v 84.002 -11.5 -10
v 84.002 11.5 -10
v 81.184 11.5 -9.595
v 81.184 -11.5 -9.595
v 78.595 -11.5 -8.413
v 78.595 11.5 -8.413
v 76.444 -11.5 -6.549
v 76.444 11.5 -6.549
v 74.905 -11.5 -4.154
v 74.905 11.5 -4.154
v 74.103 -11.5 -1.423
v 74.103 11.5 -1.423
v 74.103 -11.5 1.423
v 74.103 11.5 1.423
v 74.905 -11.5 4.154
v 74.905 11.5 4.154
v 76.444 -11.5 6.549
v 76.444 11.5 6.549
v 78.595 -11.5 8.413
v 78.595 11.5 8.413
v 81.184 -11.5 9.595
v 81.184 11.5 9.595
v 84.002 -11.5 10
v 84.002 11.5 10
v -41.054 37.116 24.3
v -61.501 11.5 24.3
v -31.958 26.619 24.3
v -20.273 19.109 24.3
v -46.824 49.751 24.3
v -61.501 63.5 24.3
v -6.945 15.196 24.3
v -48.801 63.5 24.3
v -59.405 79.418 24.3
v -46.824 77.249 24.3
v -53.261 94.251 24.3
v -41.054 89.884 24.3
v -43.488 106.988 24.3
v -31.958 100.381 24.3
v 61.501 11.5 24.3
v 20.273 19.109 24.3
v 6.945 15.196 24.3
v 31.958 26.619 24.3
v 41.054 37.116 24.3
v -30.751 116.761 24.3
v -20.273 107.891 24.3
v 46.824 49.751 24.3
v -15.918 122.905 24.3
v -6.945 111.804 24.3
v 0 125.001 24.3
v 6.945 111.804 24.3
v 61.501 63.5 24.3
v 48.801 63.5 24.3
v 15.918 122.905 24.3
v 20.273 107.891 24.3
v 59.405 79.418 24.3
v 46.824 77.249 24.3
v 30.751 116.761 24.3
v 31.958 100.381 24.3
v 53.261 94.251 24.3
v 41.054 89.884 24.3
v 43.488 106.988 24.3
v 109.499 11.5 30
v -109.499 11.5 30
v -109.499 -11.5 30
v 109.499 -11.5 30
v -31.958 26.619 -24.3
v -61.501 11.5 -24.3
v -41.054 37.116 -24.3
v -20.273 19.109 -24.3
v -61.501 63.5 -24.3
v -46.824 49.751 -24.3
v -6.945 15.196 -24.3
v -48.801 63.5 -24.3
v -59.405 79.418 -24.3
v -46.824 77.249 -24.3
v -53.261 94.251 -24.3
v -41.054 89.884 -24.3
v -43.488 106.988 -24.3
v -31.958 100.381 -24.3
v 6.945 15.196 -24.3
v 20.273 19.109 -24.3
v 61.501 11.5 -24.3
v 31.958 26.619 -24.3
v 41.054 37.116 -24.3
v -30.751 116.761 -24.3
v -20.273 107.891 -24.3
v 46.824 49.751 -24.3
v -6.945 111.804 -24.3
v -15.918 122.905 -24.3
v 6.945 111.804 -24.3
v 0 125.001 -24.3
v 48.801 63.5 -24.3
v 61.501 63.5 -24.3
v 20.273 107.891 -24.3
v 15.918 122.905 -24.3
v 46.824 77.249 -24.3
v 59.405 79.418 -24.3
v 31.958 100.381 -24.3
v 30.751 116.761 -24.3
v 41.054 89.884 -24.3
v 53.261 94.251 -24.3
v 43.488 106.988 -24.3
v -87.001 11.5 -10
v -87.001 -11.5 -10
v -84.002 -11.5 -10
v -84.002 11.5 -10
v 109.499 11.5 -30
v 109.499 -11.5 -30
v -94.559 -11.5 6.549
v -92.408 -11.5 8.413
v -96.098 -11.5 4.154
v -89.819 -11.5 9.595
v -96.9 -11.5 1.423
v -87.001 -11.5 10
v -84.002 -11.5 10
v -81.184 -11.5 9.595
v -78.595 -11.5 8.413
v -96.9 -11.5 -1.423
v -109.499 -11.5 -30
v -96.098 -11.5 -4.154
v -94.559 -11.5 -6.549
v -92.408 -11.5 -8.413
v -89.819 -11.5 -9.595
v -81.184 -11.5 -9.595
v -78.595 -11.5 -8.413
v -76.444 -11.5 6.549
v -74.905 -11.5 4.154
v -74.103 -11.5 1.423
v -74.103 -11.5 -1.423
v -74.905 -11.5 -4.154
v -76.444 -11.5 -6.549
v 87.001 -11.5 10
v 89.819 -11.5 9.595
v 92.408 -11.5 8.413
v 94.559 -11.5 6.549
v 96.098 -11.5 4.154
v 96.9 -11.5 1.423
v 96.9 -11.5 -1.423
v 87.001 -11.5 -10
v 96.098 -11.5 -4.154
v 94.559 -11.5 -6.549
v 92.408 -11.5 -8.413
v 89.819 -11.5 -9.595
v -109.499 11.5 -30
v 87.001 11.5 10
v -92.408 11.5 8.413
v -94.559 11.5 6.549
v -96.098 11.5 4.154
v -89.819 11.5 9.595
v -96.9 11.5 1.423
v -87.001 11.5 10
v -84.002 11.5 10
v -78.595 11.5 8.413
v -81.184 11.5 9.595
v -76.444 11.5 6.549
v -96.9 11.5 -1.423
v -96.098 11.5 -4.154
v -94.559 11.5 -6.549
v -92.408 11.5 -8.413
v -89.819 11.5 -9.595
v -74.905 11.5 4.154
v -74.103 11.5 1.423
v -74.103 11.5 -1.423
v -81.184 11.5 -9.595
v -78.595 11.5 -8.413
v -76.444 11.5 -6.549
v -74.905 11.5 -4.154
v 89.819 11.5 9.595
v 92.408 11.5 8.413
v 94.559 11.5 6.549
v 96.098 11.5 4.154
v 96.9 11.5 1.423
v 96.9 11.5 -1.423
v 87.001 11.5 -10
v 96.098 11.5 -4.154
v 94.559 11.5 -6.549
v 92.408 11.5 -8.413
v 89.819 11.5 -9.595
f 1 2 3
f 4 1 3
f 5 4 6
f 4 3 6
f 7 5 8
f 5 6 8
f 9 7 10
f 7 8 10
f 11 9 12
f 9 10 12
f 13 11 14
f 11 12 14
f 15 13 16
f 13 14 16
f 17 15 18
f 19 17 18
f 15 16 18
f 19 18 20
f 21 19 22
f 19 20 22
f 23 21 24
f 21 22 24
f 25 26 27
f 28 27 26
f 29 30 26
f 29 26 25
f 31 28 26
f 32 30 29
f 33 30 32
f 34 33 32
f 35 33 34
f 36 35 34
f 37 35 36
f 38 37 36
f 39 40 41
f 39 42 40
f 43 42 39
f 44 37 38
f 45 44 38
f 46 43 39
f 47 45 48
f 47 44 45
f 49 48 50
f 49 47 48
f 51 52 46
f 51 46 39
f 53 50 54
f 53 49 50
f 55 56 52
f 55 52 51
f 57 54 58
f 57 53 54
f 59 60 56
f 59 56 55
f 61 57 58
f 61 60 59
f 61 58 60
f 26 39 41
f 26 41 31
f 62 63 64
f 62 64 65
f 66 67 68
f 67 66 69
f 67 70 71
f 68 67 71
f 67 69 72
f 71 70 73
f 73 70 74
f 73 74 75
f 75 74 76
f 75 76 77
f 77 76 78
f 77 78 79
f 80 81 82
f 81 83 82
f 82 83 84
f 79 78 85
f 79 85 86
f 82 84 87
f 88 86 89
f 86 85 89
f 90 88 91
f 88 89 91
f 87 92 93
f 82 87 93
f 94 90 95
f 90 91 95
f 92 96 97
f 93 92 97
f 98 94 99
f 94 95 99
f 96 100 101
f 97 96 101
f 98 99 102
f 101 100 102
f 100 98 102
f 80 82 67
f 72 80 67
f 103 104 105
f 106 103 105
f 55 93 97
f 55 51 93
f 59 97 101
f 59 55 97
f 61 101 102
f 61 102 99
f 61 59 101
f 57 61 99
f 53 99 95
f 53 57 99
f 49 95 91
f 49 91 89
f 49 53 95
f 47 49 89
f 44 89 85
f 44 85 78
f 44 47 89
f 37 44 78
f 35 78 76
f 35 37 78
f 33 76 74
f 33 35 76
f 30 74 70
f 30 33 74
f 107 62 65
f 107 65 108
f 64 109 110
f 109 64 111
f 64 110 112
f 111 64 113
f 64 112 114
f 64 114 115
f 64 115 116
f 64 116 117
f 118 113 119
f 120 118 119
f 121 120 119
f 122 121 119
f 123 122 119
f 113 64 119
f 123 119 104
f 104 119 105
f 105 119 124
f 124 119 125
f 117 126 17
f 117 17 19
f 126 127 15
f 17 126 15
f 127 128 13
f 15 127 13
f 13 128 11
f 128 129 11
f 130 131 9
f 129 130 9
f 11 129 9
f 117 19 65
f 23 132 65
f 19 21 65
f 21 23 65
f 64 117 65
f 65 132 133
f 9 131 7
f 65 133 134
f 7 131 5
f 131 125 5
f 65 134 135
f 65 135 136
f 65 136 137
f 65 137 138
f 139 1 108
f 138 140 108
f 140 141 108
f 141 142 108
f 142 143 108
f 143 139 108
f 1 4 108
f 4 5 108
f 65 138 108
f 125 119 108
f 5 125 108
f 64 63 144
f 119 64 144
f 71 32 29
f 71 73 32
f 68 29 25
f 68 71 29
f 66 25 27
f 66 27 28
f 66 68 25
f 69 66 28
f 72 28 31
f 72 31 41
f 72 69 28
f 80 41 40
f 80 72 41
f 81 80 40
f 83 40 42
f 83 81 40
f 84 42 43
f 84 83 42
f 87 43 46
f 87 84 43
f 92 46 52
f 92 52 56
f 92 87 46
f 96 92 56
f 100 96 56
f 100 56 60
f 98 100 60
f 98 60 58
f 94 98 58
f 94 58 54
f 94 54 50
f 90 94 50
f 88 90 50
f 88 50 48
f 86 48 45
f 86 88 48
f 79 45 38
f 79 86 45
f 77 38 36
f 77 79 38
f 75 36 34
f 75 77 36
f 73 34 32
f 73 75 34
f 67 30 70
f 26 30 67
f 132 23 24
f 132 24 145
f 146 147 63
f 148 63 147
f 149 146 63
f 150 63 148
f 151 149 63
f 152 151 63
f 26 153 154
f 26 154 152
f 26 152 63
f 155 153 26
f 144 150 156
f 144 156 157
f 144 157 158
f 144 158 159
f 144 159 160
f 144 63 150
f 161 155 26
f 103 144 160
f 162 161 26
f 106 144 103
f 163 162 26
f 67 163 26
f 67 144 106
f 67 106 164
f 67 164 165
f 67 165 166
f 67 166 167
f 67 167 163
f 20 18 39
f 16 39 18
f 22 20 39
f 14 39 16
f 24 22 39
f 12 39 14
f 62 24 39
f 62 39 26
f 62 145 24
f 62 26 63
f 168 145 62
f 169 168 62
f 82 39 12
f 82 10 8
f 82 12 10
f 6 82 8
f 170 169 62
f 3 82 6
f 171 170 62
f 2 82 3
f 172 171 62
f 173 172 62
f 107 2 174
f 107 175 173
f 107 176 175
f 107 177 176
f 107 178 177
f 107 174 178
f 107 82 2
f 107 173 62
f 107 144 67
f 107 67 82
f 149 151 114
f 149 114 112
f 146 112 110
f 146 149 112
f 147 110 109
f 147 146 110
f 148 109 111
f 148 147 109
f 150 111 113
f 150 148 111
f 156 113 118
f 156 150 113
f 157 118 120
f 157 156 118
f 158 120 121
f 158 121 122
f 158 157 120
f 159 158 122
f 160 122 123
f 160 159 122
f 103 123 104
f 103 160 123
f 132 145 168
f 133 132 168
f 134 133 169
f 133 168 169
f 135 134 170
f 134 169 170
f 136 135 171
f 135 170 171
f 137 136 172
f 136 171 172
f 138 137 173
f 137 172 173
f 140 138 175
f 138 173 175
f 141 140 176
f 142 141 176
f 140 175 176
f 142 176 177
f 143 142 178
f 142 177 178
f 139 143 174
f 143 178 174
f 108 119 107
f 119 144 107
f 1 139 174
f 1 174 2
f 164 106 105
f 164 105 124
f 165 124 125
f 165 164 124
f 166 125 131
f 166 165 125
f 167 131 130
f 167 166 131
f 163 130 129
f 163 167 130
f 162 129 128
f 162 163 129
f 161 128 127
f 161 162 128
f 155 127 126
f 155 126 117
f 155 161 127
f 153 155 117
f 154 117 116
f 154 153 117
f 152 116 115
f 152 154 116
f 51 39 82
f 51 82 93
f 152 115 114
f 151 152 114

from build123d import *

# Parameters (mm, degrees)
SKETCH1_W           = 218.9988
SKETCH1_H           = 59.99988
BOSS_EXTRUDE1_DEPTH = 11.49985
CUT_EXTRUDE1_DEPTH  = 22.9997
SKETCH3_R           = 48.80102
BOSS_EXTRUDE2_DEPTH = 24.30018


with BuildPart() as part:
    # Sketch1 → Boss-Extrude1 (new, symmetric)
    with BuildSketch(Plane(origin=(0, 0, 0), x_dir=(1, 0, 0), z_dir=(0, 1, 0))):
        Rectangle(SKETCH1_W, SKETCH1_H)
    extrude(amount=BOSS_EXTRUDE1_DEPTH, both=True)

    # Sketch2 → Cut-Extrude1 (cut)
    with BuildSketch(Plane(origin=(0, 11.49985, 0), x_dir=(1, 0, 0), z_dir=(0, 1, 0))):
        with BuildLine():
            Line((-87.00135, 9.99998), (-84.00161, 9.99998))
            ThreePointArc((-84.00161, 9.99998), (-74.00163, 0), (-84.00161, -9.99998))
            Line((-84.00161, -9.99998), (-87.00135, -9.99998))
            ThreePointArc((-87.00135, -9.99998), (-97.00133, 0), (-87.00135, 9.99998))
        make_face()
        with BuildLine():
            Line((87.00135, 9.99998), (84.00161, 9.99998))
            ThreePointArc((84.00161, 9.99998), (74.00163, 0), (84.00161, -9.99998))
            Line((84.00161, -9.99998), (87.00135, -9.99998))
            ThreePointArc((87.00135, -9.99998), (97.00133, 0), (87.00135, 9.99998))
        make_face()
    extrude(amount=-CUT_EXTRUDE1_DEPTH, mode=Mode.SUBTRACT)

    # Sketch3 → Boss-Extrude2 (add, symmetric)
    with BuildSketch(Plane.XY):
        with BuildLine():
            Line((-61.50102, 63.5), (-61.50102, 11.49985))
            Line((-61.50102, 11.49985), (61.50102, 11.49985))
            Line((61.50102, 11.49985), (61.50102, 63.5))
            ThreePointArc((61.50102, 63.5), (0, 125.00102), (-61.50102, 63.5))
        make_face()
        with Locations(Location((0, 63.5, 0), (0, 0, 180))):
            Circle(SKETCH3_R, mode=Mode.SUBTRACT)
    extrude(amount=BOSS_EXTRUDE2_DEPTH, both=True)


solid = part.part
